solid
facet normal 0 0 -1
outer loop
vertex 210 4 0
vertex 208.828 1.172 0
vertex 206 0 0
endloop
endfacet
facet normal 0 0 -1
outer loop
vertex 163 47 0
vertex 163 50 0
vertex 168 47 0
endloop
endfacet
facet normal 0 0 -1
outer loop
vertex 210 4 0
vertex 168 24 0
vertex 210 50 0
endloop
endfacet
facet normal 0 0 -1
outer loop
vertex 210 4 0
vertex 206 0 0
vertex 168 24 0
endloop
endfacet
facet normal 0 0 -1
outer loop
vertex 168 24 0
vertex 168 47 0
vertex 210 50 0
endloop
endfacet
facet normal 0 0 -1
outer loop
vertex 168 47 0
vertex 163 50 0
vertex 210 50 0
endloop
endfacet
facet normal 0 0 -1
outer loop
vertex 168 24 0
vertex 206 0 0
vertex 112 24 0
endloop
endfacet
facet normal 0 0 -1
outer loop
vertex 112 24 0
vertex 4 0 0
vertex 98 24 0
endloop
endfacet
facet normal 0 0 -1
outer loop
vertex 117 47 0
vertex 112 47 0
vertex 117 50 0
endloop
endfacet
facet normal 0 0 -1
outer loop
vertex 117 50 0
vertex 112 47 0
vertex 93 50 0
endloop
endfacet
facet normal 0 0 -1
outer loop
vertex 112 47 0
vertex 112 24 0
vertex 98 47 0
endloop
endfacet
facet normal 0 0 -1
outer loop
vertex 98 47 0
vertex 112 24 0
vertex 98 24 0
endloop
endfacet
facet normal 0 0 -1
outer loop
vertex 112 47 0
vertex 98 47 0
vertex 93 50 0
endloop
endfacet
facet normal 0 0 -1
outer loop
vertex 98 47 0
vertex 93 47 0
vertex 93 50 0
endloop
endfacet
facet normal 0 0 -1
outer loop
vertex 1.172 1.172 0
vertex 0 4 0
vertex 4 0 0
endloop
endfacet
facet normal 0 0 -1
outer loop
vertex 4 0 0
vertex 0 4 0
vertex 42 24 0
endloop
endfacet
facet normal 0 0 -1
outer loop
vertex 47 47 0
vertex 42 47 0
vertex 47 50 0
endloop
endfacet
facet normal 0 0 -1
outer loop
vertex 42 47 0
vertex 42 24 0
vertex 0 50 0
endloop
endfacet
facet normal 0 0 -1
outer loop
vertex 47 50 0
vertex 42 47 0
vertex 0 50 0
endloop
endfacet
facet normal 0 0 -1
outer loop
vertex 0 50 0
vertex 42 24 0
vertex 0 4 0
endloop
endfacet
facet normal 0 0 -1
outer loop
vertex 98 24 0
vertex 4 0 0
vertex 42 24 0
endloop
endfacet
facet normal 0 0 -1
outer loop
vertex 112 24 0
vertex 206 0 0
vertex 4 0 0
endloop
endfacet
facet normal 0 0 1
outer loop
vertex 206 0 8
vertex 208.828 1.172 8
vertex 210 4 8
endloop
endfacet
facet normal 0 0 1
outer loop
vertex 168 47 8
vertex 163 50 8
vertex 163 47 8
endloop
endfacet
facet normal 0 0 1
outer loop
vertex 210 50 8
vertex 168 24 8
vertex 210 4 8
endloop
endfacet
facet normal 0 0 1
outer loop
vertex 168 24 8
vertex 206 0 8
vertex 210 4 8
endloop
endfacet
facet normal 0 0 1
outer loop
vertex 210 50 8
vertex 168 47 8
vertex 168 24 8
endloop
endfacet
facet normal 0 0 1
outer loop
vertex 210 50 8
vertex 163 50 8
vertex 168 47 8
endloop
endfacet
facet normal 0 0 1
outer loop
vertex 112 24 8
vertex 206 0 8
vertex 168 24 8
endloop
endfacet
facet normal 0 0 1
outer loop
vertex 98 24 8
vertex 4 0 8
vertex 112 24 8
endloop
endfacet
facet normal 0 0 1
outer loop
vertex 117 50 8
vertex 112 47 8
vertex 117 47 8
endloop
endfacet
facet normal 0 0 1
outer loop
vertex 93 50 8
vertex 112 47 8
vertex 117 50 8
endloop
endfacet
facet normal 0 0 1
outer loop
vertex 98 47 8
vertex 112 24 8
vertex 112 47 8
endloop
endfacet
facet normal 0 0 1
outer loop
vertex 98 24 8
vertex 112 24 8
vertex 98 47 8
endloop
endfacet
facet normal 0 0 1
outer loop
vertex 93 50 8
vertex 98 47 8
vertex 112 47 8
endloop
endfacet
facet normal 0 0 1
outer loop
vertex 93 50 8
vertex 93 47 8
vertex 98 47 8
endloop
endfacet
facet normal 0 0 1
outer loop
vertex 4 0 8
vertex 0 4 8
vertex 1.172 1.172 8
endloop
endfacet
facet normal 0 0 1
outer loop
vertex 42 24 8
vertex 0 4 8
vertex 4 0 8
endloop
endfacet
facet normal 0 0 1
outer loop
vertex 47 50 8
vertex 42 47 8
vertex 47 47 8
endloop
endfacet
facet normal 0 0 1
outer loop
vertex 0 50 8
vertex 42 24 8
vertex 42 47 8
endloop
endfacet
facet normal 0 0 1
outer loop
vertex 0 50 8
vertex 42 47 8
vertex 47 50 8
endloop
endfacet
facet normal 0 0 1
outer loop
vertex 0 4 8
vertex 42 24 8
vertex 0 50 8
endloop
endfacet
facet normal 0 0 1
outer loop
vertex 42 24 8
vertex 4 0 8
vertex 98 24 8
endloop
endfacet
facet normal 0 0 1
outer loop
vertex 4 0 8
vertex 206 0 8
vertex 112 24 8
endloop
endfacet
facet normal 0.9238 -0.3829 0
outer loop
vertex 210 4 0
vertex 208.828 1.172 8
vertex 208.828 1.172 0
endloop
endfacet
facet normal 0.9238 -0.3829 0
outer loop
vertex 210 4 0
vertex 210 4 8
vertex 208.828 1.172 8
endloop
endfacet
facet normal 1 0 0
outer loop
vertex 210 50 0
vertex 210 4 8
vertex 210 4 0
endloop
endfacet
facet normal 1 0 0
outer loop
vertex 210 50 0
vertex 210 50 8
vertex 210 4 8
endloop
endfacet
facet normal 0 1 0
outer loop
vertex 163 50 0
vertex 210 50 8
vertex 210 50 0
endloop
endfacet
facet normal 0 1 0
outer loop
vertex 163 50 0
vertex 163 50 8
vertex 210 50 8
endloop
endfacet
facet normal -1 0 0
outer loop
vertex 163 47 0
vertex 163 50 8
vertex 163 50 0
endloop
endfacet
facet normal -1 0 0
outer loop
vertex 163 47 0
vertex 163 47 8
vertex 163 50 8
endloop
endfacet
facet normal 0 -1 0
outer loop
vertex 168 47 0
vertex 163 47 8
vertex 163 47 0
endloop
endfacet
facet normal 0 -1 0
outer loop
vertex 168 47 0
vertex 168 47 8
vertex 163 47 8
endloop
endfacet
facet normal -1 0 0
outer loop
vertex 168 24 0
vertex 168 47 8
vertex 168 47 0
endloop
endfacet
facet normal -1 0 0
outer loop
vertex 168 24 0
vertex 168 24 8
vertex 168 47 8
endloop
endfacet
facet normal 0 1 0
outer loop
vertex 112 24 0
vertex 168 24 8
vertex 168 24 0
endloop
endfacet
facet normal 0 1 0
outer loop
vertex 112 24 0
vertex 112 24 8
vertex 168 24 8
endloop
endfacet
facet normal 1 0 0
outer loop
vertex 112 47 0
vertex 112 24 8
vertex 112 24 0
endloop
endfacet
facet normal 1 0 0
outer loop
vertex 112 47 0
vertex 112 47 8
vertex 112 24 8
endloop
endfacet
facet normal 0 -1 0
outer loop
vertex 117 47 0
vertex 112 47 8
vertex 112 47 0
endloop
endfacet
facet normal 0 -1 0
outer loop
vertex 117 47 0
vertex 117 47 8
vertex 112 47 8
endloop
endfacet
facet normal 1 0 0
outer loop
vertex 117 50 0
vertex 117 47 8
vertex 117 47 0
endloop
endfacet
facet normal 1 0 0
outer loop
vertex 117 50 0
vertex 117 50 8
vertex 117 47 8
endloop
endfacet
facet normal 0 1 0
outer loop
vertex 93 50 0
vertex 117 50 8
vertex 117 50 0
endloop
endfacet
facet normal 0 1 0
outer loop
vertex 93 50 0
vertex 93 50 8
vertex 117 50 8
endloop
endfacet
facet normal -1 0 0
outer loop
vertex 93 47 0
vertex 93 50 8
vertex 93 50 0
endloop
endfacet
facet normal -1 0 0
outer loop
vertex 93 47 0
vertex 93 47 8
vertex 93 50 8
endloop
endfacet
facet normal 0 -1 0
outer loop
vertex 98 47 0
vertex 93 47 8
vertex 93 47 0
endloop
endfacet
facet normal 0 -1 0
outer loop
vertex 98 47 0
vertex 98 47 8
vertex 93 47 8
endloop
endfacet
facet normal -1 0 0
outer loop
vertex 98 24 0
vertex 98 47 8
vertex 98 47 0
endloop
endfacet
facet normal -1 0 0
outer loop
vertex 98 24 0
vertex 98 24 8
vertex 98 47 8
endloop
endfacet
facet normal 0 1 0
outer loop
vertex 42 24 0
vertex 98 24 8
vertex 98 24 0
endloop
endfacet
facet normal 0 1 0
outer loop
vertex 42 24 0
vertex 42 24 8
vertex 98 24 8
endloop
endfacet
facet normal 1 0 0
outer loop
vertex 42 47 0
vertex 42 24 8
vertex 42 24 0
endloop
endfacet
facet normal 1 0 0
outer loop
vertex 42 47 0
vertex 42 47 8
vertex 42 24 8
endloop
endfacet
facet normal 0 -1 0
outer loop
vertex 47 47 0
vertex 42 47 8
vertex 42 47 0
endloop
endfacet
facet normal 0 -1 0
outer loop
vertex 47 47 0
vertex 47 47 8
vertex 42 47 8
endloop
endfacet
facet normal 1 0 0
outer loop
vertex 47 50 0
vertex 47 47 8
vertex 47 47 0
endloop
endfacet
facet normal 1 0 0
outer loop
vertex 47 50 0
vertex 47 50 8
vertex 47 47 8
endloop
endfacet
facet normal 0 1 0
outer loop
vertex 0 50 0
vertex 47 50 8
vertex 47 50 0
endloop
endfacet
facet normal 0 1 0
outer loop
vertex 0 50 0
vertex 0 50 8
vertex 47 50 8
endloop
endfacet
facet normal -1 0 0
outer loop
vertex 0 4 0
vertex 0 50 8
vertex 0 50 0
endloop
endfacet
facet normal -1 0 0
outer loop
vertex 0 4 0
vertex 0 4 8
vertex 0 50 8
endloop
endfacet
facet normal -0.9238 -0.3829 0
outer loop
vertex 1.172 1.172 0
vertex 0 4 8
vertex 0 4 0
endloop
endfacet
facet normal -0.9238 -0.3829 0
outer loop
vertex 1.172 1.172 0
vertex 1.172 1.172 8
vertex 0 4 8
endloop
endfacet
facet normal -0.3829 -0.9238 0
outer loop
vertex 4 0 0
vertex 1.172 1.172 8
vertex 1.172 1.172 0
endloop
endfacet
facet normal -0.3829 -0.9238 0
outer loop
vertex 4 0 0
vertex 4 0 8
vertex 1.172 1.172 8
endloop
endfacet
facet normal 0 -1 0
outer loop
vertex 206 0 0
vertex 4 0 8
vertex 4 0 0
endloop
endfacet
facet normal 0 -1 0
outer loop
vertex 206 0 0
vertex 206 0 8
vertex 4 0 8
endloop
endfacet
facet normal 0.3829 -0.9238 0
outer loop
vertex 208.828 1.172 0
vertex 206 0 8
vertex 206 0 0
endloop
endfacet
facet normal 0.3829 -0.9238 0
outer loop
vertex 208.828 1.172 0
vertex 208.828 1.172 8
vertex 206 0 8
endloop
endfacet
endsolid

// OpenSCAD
$fn = 32;

// ----------------------------------------------------------------------
// Oversize slot bar: 210 mm bar with 2 oversize windows
// ----------------------------------------------------------------------

// --- parameters (mm) ---
profile_height = 8;       // extrusion height
profile_points = 24;      // points of the closed outline

profile = [[0, 4], [1.172, 1.172], [4, 0], [206, 0], [208.828, 1.172], [210, 4], [210, 50], [163, 50], [163, 47], [168, 47], [168, 24], [112, 24], [112, 47], [117, 47], [117, 50], [93, 50], [93, 47], [98, 47], [98, 24], [42, 24], [42, 47], [47, 47], [47, 50], [0, 50]];  // single closed polygon, 24 points, counter clockwise

// --- the one profile operation ---
linear_extrude(height = profile_height) polygon(points = profile);
